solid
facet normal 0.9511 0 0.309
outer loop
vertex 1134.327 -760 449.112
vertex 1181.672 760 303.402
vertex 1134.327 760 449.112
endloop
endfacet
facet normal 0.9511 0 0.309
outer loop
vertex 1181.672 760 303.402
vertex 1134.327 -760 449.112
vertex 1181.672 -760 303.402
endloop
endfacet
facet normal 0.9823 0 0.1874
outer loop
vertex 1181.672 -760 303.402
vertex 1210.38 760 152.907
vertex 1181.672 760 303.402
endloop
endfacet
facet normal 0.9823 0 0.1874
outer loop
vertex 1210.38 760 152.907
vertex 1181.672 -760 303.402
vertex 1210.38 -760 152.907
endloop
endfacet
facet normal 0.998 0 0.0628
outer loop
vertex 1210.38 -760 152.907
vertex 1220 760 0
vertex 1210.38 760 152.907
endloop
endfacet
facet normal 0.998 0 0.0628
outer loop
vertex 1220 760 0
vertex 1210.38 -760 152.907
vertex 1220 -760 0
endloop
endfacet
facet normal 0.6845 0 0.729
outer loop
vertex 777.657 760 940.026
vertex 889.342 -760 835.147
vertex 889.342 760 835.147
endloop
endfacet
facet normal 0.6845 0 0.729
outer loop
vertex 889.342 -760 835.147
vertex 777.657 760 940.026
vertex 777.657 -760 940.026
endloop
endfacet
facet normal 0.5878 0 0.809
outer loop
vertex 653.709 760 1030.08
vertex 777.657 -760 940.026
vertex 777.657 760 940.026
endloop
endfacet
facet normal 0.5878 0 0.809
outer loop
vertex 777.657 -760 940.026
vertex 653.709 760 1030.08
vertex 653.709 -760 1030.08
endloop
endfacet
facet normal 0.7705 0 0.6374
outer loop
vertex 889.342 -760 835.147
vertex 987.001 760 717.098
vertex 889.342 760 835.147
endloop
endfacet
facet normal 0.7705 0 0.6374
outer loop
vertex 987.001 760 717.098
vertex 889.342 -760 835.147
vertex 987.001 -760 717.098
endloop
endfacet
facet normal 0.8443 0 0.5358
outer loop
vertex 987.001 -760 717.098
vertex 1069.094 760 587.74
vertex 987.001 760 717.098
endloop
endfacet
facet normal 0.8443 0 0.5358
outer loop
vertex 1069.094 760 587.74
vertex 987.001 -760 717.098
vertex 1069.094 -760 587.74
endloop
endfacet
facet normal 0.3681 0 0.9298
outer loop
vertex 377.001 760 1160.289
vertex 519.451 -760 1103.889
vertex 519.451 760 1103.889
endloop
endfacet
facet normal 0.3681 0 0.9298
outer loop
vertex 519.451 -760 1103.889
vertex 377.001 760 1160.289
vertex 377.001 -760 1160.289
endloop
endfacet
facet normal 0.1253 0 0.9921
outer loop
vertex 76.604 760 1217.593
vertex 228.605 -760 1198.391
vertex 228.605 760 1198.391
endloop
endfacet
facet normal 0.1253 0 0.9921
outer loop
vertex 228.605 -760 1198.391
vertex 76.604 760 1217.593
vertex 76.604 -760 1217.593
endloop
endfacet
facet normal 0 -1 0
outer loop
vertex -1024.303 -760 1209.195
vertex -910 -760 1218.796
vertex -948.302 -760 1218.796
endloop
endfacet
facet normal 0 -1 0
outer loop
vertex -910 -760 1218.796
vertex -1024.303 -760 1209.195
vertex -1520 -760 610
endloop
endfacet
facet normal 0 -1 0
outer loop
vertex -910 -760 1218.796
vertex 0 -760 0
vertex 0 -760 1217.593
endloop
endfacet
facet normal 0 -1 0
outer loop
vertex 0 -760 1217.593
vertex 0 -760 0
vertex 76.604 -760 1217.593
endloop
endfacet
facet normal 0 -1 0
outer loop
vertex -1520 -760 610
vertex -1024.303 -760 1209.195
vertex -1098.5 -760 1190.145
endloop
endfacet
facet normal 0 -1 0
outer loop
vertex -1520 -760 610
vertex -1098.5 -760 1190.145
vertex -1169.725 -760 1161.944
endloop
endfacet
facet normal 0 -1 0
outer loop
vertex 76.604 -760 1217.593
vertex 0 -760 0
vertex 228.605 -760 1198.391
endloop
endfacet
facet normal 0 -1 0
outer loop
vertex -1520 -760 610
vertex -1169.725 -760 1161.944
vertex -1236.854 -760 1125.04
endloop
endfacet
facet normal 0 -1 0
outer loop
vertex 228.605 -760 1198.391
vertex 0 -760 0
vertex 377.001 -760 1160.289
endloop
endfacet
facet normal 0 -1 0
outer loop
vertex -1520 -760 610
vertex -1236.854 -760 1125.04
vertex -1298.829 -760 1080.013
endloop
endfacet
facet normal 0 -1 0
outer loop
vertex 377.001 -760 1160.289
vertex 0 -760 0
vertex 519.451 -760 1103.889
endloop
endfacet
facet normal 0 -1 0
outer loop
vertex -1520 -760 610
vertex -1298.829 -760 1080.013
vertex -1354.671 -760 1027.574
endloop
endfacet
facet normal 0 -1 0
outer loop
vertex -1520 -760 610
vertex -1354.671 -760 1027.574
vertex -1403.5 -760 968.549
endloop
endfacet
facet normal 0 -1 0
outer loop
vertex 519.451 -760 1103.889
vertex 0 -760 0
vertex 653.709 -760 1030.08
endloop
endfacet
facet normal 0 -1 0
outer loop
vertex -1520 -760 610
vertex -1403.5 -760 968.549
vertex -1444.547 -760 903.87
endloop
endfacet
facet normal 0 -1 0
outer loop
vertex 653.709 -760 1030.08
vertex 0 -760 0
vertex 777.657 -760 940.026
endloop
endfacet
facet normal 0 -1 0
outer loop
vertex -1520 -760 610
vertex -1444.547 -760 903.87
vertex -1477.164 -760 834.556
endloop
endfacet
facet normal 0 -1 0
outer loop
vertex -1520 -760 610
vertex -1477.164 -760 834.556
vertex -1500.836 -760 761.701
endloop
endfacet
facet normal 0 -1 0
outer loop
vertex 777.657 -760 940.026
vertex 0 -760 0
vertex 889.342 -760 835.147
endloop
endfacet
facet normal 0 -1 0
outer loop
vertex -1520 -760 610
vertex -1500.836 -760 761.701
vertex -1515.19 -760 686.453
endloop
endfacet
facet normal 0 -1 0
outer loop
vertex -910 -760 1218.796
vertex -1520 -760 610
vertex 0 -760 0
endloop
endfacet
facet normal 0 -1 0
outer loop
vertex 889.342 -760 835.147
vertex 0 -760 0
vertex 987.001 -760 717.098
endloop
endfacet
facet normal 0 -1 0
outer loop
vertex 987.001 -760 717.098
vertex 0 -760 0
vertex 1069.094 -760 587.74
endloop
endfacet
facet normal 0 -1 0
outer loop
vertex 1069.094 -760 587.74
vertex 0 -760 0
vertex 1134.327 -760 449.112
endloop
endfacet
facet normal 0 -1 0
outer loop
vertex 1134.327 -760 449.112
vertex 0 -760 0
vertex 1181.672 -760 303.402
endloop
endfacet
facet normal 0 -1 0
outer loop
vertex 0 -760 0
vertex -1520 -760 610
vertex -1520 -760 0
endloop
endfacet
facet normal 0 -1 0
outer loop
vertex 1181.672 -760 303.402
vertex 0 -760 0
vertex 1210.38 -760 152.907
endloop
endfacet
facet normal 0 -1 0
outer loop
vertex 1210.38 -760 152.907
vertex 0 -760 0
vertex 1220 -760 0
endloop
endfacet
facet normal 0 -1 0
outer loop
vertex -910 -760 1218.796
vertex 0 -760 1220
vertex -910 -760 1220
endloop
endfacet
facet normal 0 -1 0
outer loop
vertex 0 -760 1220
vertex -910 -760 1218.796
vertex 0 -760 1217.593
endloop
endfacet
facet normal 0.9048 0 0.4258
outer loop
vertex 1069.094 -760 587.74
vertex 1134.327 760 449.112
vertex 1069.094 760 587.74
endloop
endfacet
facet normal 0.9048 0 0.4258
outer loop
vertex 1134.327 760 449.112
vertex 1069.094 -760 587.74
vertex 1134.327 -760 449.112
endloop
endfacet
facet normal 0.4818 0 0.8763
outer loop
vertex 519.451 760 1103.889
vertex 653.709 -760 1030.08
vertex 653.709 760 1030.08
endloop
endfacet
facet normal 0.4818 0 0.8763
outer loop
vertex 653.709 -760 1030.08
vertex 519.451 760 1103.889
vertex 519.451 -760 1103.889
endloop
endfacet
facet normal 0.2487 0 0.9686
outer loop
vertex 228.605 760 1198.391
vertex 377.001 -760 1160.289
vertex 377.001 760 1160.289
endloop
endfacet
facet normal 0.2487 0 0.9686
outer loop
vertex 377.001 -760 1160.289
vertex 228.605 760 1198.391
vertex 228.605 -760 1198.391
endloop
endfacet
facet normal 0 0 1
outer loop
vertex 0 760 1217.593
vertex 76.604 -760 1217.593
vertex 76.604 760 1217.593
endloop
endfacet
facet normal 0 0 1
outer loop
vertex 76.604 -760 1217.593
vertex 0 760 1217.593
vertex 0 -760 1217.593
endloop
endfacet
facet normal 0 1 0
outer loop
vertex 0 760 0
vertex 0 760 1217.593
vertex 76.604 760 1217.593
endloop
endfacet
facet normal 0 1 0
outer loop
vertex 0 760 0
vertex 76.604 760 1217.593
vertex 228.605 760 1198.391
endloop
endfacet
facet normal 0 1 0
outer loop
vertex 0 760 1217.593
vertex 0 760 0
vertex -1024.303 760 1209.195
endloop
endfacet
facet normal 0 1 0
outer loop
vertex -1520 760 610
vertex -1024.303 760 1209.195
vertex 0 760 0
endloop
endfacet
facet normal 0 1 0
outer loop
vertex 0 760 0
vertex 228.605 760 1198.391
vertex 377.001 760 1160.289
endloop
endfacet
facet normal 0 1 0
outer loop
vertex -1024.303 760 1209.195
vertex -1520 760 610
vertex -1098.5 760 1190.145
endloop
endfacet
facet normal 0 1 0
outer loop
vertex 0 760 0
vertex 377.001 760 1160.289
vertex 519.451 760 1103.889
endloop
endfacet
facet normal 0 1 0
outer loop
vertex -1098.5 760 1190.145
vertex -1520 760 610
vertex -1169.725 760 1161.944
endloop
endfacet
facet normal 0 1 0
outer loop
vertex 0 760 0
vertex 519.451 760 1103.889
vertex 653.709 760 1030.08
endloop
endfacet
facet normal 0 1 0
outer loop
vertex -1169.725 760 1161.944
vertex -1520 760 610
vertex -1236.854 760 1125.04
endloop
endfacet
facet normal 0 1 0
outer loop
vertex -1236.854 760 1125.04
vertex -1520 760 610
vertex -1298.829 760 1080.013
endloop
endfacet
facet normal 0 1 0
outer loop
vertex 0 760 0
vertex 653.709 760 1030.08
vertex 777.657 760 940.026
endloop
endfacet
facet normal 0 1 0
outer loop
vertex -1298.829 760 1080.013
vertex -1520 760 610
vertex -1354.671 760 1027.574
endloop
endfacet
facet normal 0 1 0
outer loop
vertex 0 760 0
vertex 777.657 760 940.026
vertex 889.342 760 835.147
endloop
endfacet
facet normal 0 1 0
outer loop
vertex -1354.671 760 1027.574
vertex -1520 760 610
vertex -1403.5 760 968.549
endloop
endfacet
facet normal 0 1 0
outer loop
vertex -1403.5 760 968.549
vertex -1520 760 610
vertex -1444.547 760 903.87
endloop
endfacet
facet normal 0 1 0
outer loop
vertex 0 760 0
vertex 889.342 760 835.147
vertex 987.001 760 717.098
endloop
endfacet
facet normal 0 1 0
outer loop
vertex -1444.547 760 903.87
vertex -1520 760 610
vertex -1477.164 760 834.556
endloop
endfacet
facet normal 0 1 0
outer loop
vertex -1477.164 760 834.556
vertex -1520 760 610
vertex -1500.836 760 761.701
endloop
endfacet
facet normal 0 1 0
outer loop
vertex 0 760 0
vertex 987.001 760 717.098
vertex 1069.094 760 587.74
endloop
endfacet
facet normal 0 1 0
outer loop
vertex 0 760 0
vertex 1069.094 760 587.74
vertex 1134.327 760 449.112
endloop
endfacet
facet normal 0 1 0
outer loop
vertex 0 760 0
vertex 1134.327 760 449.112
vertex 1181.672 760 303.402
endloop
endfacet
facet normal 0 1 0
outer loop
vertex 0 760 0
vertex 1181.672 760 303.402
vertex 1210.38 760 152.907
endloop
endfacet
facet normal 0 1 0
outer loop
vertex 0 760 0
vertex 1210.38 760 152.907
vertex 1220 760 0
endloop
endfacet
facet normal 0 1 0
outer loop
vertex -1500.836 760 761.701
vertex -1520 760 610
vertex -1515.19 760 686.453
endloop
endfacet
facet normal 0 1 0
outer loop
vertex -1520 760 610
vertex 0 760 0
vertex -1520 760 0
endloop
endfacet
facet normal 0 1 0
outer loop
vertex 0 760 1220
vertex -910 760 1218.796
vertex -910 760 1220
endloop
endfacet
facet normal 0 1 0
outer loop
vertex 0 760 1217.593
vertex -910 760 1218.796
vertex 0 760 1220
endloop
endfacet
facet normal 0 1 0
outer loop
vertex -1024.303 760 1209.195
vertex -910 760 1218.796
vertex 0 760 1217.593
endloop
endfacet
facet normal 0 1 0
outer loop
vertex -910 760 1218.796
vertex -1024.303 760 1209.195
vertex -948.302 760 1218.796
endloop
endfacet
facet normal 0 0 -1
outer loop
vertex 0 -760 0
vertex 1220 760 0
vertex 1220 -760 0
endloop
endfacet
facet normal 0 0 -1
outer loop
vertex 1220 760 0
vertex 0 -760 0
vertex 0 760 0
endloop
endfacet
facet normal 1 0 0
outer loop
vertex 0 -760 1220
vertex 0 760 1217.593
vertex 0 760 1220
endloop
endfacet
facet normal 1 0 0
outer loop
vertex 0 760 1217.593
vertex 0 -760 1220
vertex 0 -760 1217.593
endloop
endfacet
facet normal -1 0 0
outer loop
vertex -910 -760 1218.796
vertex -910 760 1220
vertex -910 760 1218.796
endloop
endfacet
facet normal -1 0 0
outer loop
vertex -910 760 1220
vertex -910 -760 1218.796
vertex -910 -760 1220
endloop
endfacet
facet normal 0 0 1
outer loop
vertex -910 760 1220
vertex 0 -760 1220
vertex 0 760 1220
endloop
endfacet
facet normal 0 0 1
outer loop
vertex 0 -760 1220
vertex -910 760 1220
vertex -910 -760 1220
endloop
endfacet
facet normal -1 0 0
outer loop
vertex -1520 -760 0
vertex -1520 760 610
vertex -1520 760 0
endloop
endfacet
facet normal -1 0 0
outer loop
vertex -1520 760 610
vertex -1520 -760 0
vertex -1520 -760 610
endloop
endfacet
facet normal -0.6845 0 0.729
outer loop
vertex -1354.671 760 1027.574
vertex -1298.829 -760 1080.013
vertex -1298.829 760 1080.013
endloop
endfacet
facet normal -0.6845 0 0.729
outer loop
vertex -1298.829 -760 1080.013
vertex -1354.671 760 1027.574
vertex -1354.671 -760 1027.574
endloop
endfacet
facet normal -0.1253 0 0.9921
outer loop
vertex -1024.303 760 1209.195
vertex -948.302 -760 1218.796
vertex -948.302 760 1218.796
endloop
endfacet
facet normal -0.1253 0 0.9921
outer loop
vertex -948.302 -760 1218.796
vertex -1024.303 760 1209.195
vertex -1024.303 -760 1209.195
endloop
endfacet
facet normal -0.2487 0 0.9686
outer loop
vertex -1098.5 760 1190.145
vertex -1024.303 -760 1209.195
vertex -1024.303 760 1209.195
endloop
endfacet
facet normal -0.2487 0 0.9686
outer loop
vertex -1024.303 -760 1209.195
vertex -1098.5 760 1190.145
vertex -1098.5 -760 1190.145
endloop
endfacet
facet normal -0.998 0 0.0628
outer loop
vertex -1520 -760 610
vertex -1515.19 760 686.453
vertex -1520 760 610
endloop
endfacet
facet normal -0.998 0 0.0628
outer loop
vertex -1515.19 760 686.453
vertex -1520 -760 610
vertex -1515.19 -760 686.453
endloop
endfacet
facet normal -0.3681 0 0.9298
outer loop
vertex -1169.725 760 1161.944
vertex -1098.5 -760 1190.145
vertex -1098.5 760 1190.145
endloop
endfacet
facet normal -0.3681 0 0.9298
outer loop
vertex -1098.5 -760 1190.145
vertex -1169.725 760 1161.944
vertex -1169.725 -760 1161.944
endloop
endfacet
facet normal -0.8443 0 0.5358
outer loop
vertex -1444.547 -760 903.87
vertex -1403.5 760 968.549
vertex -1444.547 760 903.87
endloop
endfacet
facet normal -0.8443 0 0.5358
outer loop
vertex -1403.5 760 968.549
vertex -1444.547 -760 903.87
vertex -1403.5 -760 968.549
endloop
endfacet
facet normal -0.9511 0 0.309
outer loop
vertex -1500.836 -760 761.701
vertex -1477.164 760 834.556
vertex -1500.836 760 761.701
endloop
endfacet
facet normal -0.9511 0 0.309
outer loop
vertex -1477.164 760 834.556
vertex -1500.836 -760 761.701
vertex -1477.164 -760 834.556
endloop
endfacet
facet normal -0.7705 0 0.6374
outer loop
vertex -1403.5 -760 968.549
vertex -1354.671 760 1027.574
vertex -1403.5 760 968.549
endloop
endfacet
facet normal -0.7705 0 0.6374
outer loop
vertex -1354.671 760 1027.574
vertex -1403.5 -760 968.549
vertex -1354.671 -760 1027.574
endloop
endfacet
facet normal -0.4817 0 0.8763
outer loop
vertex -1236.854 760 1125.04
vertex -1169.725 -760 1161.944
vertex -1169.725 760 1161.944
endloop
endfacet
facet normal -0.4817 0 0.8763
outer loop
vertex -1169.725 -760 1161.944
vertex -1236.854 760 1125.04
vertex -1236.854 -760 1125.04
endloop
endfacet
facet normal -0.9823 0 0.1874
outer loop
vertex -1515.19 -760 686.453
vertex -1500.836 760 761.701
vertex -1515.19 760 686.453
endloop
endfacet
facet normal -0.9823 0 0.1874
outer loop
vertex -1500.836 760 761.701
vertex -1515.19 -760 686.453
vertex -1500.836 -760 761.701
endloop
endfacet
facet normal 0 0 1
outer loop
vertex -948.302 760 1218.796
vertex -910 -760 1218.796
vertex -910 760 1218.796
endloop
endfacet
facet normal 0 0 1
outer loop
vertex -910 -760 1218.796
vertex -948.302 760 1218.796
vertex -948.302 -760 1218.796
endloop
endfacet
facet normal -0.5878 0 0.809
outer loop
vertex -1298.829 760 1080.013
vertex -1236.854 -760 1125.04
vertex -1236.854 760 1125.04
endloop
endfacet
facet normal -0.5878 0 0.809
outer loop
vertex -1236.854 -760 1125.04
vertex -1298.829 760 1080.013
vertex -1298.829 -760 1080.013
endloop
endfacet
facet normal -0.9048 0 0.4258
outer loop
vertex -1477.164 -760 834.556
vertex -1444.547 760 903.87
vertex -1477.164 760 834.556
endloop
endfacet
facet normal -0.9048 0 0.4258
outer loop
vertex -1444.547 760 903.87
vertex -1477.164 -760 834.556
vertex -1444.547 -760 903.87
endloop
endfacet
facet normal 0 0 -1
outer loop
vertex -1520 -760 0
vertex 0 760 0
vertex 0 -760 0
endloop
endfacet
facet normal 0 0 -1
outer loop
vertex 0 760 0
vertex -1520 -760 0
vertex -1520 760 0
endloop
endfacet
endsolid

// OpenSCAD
cabin_height = 1220; // 4ft
cabin_width = 1520; // 5ft
cabin_length = 2740; // 9ft

$fn = 50; // fragment number

union() {
  difference() {
    // Starting cylinder
    rotate([90, 0, 0])
      cylinder(cabin_width, r = cabin_height, center = true);

    // left half remove
    translate([0, 0, -cabin_height + (cabin_height / 2)])
      cube([cabin_height * 2, cabin_width, cabin_height], center = true);

    // bottom half remove
    translate([-cabin_height + (cabin_height / 2), 0, 0])
      cube([cabin_height, cabin_width, cabin_height * 2], center = true);
  }

  difference() {
    cabin_block_size = cabin_length - cabin_height;

    translate([-cabin_block_size, -(cabin_width / 2), 0])
      cube([cabin_block_size, cabin_width, cabin_height]);

    translate([-(cabin_block_size - (cabin_height / 2)), 0, cabin_height / 2])
    difference() {
      translate([-(cabin_height / 2), -(cabin_width / 2), 0])
        cube([cabin_height / 2, cabin_width, cabin_height / 2]);

      rotate([90, 0, 0])
        cylinder(cabin_width, d = cabin_height, center = true);
    }
  }
}
